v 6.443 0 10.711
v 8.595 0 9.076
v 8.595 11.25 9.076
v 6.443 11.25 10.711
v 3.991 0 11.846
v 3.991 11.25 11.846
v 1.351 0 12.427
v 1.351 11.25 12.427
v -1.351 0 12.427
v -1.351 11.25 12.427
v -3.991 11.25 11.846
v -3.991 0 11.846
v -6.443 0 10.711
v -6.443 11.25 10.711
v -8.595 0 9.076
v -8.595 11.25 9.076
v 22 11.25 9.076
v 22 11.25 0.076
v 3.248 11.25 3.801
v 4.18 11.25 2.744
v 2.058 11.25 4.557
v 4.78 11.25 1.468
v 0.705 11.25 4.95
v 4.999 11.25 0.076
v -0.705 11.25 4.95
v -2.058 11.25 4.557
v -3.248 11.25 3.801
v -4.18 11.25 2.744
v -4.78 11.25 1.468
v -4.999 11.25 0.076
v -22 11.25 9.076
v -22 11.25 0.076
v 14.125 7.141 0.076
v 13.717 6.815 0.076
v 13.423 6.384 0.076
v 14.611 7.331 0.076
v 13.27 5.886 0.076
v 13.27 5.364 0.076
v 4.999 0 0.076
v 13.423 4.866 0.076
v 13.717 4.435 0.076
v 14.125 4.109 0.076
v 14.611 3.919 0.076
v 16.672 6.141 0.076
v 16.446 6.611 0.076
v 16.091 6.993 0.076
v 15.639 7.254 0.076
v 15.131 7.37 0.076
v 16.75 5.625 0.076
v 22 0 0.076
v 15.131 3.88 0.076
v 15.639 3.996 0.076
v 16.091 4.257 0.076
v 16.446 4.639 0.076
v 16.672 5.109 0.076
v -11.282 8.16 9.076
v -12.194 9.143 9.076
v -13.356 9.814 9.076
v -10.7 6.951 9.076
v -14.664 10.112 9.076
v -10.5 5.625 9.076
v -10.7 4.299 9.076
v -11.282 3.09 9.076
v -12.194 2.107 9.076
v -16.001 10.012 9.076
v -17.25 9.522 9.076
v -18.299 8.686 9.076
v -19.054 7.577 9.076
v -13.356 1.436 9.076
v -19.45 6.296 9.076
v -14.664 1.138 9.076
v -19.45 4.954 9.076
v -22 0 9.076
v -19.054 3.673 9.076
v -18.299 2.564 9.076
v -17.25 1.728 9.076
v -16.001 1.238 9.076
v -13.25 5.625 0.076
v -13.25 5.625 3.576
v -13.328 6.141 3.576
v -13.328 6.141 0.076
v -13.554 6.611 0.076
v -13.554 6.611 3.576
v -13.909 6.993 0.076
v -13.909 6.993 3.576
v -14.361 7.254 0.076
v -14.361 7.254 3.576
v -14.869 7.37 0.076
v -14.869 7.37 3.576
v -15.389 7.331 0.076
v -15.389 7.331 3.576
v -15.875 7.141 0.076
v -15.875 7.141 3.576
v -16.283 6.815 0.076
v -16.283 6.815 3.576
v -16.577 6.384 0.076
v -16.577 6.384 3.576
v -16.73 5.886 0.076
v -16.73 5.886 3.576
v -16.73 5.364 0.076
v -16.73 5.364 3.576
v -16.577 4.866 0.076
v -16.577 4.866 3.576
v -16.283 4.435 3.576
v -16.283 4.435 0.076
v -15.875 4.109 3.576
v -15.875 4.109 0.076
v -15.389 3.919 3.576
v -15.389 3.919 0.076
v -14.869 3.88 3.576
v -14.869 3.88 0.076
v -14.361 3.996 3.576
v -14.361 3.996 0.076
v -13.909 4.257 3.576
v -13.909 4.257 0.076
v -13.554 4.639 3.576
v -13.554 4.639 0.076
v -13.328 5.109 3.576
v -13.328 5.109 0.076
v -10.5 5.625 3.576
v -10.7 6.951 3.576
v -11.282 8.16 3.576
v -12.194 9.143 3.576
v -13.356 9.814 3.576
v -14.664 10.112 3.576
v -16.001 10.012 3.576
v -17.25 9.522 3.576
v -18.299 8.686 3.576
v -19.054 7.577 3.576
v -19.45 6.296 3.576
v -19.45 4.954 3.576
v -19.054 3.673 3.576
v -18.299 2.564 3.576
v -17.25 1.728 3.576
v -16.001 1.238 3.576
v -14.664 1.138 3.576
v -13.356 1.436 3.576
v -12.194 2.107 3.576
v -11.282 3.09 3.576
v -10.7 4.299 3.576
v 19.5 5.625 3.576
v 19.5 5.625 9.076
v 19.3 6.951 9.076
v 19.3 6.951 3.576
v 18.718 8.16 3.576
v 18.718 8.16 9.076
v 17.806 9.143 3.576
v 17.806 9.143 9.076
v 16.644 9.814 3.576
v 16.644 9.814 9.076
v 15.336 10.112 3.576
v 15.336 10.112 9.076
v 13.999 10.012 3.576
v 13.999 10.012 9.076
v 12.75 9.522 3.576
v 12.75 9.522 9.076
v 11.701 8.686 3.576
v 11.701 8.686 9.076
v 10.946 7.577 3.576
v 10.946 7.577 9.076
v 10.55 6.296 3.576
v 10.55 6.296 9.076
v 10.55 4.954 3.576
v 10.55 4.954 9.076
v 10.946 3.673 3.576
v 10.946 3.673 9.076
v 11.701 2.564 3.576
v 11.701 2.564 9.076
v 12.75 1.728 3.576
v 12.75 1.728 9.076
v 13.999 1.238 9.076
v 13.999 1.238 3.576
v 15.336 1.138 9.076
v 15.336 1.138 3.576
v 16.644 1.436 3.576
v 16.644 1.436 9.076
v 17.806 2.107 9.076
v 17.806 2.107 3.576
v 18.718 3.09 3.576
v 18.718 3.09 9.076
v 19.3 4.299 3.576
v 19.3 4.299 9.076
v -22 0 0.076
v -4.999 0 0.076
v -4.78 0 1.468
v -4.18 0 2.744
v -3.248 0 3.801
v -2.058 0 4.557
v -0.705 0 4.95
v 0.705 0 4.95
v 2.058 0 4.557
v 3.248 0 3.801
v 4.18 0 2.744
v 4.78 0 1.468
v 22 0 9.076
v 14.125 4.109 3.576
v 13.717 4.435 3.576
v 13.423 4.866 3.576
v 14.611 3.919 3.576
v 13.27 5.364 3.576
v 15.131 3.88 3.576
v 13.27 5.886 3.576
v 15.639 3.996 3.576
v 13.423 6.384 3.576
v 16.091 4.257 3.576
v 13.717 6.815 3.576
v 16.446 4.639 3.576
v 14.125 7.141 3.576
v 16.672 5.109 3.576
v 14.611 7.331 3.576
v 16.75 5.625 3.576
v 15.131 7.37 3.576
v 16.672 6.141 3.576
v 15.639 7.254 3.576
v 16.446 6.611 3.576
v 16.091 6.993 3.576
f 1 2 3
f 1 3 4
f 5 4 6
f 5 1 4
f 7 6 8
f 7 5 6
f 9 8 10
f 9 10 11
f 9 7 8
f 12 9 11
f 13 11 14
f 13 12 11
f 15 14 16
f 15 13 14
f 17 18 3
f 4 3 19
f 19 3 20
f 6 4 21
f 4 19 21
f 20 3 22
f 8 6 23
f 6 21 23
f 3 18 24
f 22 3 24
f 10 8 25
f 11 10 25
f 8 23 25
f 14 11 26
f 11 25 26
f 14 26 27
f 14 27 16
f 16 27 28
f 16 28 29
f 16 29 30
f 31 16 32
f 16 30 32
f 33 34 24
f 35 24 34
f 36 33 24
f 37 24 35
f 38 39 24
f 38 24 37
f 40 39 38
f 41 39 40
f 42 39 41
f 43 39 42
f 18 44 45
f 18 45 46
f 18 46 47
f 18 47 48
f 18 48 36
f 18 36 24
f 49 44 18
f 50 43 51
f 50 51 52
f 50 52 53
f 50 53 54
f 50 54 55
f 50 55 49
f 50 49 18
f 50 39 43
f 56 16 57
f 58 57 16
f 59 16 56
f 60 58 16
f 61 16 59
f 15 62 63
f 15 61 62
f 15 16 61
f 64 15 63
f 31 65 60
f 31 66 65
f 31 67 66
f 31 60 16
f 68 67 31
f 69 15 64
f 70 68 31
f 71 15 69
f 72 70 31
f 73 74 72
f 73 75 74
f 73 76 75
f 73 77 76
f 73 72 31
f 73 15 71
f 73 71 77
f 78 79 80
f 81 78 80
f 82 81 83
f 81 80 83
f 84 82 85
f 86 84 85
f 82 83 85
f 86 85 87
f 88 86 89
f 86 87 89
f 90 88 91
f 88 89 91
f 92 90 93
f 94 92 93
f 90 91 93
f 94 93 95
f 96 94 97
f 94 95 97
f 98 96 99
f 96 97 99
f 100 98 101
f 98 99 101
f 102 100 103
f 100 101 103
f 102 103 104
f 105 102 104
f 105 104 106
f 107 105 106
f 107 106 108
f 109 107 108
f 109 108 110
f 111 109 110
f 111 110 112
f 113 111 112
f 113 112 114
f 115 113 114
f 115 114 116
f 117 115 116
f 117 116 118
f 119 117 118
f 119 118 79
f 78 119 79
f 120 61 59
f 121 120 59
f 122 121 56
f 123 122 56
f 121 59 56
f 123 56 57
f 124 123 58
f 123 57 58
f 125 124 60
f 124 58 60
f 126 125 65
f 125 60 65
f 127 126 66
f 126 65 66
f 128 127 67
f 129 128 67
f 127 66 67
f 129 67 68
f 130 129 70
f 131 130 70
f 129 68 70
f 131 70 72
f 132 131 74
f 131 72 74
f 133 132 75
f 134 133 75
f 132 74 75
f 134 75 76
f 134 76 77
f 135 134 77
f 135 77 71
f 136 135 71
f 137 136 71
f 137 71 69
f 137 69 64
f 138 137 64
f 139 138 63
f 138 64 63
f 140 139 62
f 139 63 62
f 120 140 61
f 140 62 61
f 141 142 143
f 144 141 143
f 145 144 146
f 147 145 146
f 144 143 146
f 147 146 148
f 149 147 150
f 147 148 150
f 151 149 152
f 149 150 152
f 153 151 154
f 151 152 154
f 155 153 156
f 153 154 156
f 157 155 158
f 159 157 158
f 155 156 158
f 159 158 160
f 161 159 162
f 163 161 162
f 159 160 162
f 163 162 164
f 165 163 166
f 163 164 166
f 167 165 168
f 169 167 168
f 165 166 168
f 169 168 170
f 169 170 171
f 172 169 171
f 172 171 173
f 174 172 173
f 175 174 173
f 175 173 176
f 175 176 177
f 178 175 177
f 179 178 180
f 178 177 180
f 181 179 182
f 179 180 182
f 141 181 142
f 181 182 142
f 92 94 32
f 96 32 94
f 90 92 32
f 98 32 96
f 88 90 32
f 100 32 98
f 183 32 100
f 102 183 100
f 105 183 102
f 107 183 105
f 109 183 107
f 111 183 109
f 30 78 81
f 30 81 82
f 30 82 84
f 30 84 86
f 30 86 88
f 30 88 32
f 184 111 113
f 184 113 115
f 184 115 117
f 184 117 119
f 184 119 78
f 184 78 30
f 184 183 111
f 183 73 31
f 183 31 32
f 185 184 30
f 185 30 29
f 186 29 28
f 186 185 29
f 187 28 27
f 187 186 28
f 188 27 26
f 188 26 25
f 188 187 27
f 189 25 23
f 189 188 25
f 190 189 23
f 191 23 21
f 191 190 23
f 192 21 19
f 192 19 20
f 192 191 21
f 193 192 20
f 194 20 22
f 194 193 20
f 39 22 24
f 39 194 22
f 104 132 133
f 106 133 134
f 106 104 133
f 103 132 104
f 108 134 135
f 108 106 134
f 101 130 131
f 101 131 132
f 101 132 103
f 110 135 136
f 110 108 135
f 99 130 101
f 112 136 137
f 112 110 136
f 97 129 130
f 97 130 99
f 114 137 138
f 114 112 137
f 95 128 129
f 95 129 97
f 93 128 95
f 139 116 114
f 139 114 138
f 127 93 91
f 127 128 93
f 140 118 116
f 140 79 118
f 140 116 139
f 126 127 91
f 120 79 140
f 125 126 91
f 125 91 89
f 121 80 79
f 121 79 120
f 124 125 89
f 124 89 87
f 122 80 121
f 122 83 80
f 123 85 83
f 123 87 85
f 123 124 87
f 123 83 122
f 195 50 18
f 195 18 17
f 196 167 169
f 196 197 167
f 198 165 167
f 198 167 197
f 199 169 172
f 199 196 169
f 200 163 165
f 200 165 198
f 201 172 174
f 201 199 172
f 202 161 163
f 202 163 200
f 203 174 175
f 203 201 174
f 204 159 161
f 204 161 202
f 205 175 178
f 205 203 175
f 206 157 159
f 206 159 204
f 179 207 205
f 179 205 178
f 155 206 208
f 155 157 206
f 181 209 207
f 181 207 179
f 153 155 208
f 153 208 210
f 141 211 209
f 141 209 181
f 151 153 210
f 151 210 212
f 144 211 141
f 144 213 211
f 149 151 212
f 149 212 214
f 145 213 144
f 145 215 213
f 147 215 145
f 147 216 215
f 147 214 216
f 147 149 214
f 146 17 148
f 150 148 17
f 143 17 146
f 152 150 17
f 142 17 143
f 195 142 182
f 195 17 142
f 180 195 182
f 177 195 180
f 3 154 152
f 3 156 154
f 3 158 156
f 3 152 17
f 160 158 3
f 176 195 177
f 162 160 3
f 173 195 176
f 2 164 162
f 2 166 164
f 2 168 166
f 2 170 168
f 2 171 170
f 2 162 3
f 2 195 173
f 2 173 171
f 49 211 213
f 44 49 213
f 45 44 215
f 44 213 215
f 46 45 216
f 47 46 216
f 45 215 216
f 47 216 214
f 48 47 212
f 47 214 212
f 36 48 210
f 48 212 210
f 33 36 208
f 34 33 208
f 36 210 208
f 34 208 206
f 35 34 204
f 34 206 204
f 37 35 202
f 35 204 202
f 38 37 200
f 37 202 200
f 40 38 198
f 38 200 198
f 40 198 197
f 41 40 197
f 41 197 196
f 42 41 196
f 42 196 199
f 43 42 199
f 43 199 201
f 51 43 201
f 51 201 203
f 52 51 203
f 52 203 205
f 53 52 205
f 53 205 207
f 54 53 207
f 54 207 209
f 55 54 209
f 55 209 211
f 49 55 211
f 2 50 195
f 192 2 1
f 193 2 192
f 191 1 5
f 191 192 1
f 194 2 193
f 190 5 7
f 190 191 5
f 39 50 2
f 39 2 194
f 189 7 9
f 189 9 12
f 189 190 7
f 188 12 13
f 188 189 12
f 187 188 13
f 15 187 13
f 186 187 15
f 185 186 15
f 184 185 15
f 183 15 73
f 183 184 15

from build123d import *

# Parameters (mm, degrees)
BOSS_EXTRUDE2_DEPTH = 11.25
SKETCH3_R           = 1.75
CUT_EXTRUDE1_DEPTH  = 15
SKETCH4_R           = 4.5
CUT_EXTRUDE2_DEPTH  = 5.5


with BuildPart() as part:
    # Sketch2 → Boss-Extrude2 (new body)
    with BuildSketch(Plane(origin=(0, 0, 0), x_dir=(1, 0, 0), z_dir=(0, 1, 0))):
        with BuildLine():
            Line((4.999419692, -0.076175713), (21.999868119, -0.076175713))
            Line((21.999868119, -0.076175713), (21.999868119, -9.076175713))
            Line((21.999868119, -9.076175713), (8.594942375, -9.076175713))
            ThreePointArc((8.594942375, -9.076175713), (0, -12.5), (-8.594942375, -9.076175713))
            Line((-8.594942375, -9.076175713), (-21.999868119, -9.076175713))
            Line((-21.999868119, -9.076175713), (-21.999868119, -0.076175713))
            Line((-21.999868119, -0.076175713), (-4.999419692, -0.076175713))
            ThreePointArc((-4.999419692, -0.076175713), (0, -5), (4.999419692, -0.076175713))
        make_face()
    extrude(amount=BOSS_EXTRUDE2_DEPTH)

    # Sketch3 → Cut-Extrude1 (cut)
    with BuildSketch(Plane.XY.offset(9.076175713)):
        with Locations((15, 5.625)):
            Circle(SKETCH3_R)
        with Locations((-15, 5.625)):
            Circle(SKETCH3_R)
    extrude(amount=-CUT_EXTRUDE1_DEPTH, mode=Mode.SUBTRACT)

    # Sketch4 → Cut-Extrude2 (cut)
    with BuildSketch(Plane.XY.offset(9.076175713)):
        with Locations((15, 5.625)):
            Circle(SKETCH4_R)
        with Locations((-15, 5.625)):
            Circle(SKETCH4_R)
    extrude(amount=-CUT_EXTRUDE2_DEPTH, mode=Mode.SUBTRACT)


solid = part.part
